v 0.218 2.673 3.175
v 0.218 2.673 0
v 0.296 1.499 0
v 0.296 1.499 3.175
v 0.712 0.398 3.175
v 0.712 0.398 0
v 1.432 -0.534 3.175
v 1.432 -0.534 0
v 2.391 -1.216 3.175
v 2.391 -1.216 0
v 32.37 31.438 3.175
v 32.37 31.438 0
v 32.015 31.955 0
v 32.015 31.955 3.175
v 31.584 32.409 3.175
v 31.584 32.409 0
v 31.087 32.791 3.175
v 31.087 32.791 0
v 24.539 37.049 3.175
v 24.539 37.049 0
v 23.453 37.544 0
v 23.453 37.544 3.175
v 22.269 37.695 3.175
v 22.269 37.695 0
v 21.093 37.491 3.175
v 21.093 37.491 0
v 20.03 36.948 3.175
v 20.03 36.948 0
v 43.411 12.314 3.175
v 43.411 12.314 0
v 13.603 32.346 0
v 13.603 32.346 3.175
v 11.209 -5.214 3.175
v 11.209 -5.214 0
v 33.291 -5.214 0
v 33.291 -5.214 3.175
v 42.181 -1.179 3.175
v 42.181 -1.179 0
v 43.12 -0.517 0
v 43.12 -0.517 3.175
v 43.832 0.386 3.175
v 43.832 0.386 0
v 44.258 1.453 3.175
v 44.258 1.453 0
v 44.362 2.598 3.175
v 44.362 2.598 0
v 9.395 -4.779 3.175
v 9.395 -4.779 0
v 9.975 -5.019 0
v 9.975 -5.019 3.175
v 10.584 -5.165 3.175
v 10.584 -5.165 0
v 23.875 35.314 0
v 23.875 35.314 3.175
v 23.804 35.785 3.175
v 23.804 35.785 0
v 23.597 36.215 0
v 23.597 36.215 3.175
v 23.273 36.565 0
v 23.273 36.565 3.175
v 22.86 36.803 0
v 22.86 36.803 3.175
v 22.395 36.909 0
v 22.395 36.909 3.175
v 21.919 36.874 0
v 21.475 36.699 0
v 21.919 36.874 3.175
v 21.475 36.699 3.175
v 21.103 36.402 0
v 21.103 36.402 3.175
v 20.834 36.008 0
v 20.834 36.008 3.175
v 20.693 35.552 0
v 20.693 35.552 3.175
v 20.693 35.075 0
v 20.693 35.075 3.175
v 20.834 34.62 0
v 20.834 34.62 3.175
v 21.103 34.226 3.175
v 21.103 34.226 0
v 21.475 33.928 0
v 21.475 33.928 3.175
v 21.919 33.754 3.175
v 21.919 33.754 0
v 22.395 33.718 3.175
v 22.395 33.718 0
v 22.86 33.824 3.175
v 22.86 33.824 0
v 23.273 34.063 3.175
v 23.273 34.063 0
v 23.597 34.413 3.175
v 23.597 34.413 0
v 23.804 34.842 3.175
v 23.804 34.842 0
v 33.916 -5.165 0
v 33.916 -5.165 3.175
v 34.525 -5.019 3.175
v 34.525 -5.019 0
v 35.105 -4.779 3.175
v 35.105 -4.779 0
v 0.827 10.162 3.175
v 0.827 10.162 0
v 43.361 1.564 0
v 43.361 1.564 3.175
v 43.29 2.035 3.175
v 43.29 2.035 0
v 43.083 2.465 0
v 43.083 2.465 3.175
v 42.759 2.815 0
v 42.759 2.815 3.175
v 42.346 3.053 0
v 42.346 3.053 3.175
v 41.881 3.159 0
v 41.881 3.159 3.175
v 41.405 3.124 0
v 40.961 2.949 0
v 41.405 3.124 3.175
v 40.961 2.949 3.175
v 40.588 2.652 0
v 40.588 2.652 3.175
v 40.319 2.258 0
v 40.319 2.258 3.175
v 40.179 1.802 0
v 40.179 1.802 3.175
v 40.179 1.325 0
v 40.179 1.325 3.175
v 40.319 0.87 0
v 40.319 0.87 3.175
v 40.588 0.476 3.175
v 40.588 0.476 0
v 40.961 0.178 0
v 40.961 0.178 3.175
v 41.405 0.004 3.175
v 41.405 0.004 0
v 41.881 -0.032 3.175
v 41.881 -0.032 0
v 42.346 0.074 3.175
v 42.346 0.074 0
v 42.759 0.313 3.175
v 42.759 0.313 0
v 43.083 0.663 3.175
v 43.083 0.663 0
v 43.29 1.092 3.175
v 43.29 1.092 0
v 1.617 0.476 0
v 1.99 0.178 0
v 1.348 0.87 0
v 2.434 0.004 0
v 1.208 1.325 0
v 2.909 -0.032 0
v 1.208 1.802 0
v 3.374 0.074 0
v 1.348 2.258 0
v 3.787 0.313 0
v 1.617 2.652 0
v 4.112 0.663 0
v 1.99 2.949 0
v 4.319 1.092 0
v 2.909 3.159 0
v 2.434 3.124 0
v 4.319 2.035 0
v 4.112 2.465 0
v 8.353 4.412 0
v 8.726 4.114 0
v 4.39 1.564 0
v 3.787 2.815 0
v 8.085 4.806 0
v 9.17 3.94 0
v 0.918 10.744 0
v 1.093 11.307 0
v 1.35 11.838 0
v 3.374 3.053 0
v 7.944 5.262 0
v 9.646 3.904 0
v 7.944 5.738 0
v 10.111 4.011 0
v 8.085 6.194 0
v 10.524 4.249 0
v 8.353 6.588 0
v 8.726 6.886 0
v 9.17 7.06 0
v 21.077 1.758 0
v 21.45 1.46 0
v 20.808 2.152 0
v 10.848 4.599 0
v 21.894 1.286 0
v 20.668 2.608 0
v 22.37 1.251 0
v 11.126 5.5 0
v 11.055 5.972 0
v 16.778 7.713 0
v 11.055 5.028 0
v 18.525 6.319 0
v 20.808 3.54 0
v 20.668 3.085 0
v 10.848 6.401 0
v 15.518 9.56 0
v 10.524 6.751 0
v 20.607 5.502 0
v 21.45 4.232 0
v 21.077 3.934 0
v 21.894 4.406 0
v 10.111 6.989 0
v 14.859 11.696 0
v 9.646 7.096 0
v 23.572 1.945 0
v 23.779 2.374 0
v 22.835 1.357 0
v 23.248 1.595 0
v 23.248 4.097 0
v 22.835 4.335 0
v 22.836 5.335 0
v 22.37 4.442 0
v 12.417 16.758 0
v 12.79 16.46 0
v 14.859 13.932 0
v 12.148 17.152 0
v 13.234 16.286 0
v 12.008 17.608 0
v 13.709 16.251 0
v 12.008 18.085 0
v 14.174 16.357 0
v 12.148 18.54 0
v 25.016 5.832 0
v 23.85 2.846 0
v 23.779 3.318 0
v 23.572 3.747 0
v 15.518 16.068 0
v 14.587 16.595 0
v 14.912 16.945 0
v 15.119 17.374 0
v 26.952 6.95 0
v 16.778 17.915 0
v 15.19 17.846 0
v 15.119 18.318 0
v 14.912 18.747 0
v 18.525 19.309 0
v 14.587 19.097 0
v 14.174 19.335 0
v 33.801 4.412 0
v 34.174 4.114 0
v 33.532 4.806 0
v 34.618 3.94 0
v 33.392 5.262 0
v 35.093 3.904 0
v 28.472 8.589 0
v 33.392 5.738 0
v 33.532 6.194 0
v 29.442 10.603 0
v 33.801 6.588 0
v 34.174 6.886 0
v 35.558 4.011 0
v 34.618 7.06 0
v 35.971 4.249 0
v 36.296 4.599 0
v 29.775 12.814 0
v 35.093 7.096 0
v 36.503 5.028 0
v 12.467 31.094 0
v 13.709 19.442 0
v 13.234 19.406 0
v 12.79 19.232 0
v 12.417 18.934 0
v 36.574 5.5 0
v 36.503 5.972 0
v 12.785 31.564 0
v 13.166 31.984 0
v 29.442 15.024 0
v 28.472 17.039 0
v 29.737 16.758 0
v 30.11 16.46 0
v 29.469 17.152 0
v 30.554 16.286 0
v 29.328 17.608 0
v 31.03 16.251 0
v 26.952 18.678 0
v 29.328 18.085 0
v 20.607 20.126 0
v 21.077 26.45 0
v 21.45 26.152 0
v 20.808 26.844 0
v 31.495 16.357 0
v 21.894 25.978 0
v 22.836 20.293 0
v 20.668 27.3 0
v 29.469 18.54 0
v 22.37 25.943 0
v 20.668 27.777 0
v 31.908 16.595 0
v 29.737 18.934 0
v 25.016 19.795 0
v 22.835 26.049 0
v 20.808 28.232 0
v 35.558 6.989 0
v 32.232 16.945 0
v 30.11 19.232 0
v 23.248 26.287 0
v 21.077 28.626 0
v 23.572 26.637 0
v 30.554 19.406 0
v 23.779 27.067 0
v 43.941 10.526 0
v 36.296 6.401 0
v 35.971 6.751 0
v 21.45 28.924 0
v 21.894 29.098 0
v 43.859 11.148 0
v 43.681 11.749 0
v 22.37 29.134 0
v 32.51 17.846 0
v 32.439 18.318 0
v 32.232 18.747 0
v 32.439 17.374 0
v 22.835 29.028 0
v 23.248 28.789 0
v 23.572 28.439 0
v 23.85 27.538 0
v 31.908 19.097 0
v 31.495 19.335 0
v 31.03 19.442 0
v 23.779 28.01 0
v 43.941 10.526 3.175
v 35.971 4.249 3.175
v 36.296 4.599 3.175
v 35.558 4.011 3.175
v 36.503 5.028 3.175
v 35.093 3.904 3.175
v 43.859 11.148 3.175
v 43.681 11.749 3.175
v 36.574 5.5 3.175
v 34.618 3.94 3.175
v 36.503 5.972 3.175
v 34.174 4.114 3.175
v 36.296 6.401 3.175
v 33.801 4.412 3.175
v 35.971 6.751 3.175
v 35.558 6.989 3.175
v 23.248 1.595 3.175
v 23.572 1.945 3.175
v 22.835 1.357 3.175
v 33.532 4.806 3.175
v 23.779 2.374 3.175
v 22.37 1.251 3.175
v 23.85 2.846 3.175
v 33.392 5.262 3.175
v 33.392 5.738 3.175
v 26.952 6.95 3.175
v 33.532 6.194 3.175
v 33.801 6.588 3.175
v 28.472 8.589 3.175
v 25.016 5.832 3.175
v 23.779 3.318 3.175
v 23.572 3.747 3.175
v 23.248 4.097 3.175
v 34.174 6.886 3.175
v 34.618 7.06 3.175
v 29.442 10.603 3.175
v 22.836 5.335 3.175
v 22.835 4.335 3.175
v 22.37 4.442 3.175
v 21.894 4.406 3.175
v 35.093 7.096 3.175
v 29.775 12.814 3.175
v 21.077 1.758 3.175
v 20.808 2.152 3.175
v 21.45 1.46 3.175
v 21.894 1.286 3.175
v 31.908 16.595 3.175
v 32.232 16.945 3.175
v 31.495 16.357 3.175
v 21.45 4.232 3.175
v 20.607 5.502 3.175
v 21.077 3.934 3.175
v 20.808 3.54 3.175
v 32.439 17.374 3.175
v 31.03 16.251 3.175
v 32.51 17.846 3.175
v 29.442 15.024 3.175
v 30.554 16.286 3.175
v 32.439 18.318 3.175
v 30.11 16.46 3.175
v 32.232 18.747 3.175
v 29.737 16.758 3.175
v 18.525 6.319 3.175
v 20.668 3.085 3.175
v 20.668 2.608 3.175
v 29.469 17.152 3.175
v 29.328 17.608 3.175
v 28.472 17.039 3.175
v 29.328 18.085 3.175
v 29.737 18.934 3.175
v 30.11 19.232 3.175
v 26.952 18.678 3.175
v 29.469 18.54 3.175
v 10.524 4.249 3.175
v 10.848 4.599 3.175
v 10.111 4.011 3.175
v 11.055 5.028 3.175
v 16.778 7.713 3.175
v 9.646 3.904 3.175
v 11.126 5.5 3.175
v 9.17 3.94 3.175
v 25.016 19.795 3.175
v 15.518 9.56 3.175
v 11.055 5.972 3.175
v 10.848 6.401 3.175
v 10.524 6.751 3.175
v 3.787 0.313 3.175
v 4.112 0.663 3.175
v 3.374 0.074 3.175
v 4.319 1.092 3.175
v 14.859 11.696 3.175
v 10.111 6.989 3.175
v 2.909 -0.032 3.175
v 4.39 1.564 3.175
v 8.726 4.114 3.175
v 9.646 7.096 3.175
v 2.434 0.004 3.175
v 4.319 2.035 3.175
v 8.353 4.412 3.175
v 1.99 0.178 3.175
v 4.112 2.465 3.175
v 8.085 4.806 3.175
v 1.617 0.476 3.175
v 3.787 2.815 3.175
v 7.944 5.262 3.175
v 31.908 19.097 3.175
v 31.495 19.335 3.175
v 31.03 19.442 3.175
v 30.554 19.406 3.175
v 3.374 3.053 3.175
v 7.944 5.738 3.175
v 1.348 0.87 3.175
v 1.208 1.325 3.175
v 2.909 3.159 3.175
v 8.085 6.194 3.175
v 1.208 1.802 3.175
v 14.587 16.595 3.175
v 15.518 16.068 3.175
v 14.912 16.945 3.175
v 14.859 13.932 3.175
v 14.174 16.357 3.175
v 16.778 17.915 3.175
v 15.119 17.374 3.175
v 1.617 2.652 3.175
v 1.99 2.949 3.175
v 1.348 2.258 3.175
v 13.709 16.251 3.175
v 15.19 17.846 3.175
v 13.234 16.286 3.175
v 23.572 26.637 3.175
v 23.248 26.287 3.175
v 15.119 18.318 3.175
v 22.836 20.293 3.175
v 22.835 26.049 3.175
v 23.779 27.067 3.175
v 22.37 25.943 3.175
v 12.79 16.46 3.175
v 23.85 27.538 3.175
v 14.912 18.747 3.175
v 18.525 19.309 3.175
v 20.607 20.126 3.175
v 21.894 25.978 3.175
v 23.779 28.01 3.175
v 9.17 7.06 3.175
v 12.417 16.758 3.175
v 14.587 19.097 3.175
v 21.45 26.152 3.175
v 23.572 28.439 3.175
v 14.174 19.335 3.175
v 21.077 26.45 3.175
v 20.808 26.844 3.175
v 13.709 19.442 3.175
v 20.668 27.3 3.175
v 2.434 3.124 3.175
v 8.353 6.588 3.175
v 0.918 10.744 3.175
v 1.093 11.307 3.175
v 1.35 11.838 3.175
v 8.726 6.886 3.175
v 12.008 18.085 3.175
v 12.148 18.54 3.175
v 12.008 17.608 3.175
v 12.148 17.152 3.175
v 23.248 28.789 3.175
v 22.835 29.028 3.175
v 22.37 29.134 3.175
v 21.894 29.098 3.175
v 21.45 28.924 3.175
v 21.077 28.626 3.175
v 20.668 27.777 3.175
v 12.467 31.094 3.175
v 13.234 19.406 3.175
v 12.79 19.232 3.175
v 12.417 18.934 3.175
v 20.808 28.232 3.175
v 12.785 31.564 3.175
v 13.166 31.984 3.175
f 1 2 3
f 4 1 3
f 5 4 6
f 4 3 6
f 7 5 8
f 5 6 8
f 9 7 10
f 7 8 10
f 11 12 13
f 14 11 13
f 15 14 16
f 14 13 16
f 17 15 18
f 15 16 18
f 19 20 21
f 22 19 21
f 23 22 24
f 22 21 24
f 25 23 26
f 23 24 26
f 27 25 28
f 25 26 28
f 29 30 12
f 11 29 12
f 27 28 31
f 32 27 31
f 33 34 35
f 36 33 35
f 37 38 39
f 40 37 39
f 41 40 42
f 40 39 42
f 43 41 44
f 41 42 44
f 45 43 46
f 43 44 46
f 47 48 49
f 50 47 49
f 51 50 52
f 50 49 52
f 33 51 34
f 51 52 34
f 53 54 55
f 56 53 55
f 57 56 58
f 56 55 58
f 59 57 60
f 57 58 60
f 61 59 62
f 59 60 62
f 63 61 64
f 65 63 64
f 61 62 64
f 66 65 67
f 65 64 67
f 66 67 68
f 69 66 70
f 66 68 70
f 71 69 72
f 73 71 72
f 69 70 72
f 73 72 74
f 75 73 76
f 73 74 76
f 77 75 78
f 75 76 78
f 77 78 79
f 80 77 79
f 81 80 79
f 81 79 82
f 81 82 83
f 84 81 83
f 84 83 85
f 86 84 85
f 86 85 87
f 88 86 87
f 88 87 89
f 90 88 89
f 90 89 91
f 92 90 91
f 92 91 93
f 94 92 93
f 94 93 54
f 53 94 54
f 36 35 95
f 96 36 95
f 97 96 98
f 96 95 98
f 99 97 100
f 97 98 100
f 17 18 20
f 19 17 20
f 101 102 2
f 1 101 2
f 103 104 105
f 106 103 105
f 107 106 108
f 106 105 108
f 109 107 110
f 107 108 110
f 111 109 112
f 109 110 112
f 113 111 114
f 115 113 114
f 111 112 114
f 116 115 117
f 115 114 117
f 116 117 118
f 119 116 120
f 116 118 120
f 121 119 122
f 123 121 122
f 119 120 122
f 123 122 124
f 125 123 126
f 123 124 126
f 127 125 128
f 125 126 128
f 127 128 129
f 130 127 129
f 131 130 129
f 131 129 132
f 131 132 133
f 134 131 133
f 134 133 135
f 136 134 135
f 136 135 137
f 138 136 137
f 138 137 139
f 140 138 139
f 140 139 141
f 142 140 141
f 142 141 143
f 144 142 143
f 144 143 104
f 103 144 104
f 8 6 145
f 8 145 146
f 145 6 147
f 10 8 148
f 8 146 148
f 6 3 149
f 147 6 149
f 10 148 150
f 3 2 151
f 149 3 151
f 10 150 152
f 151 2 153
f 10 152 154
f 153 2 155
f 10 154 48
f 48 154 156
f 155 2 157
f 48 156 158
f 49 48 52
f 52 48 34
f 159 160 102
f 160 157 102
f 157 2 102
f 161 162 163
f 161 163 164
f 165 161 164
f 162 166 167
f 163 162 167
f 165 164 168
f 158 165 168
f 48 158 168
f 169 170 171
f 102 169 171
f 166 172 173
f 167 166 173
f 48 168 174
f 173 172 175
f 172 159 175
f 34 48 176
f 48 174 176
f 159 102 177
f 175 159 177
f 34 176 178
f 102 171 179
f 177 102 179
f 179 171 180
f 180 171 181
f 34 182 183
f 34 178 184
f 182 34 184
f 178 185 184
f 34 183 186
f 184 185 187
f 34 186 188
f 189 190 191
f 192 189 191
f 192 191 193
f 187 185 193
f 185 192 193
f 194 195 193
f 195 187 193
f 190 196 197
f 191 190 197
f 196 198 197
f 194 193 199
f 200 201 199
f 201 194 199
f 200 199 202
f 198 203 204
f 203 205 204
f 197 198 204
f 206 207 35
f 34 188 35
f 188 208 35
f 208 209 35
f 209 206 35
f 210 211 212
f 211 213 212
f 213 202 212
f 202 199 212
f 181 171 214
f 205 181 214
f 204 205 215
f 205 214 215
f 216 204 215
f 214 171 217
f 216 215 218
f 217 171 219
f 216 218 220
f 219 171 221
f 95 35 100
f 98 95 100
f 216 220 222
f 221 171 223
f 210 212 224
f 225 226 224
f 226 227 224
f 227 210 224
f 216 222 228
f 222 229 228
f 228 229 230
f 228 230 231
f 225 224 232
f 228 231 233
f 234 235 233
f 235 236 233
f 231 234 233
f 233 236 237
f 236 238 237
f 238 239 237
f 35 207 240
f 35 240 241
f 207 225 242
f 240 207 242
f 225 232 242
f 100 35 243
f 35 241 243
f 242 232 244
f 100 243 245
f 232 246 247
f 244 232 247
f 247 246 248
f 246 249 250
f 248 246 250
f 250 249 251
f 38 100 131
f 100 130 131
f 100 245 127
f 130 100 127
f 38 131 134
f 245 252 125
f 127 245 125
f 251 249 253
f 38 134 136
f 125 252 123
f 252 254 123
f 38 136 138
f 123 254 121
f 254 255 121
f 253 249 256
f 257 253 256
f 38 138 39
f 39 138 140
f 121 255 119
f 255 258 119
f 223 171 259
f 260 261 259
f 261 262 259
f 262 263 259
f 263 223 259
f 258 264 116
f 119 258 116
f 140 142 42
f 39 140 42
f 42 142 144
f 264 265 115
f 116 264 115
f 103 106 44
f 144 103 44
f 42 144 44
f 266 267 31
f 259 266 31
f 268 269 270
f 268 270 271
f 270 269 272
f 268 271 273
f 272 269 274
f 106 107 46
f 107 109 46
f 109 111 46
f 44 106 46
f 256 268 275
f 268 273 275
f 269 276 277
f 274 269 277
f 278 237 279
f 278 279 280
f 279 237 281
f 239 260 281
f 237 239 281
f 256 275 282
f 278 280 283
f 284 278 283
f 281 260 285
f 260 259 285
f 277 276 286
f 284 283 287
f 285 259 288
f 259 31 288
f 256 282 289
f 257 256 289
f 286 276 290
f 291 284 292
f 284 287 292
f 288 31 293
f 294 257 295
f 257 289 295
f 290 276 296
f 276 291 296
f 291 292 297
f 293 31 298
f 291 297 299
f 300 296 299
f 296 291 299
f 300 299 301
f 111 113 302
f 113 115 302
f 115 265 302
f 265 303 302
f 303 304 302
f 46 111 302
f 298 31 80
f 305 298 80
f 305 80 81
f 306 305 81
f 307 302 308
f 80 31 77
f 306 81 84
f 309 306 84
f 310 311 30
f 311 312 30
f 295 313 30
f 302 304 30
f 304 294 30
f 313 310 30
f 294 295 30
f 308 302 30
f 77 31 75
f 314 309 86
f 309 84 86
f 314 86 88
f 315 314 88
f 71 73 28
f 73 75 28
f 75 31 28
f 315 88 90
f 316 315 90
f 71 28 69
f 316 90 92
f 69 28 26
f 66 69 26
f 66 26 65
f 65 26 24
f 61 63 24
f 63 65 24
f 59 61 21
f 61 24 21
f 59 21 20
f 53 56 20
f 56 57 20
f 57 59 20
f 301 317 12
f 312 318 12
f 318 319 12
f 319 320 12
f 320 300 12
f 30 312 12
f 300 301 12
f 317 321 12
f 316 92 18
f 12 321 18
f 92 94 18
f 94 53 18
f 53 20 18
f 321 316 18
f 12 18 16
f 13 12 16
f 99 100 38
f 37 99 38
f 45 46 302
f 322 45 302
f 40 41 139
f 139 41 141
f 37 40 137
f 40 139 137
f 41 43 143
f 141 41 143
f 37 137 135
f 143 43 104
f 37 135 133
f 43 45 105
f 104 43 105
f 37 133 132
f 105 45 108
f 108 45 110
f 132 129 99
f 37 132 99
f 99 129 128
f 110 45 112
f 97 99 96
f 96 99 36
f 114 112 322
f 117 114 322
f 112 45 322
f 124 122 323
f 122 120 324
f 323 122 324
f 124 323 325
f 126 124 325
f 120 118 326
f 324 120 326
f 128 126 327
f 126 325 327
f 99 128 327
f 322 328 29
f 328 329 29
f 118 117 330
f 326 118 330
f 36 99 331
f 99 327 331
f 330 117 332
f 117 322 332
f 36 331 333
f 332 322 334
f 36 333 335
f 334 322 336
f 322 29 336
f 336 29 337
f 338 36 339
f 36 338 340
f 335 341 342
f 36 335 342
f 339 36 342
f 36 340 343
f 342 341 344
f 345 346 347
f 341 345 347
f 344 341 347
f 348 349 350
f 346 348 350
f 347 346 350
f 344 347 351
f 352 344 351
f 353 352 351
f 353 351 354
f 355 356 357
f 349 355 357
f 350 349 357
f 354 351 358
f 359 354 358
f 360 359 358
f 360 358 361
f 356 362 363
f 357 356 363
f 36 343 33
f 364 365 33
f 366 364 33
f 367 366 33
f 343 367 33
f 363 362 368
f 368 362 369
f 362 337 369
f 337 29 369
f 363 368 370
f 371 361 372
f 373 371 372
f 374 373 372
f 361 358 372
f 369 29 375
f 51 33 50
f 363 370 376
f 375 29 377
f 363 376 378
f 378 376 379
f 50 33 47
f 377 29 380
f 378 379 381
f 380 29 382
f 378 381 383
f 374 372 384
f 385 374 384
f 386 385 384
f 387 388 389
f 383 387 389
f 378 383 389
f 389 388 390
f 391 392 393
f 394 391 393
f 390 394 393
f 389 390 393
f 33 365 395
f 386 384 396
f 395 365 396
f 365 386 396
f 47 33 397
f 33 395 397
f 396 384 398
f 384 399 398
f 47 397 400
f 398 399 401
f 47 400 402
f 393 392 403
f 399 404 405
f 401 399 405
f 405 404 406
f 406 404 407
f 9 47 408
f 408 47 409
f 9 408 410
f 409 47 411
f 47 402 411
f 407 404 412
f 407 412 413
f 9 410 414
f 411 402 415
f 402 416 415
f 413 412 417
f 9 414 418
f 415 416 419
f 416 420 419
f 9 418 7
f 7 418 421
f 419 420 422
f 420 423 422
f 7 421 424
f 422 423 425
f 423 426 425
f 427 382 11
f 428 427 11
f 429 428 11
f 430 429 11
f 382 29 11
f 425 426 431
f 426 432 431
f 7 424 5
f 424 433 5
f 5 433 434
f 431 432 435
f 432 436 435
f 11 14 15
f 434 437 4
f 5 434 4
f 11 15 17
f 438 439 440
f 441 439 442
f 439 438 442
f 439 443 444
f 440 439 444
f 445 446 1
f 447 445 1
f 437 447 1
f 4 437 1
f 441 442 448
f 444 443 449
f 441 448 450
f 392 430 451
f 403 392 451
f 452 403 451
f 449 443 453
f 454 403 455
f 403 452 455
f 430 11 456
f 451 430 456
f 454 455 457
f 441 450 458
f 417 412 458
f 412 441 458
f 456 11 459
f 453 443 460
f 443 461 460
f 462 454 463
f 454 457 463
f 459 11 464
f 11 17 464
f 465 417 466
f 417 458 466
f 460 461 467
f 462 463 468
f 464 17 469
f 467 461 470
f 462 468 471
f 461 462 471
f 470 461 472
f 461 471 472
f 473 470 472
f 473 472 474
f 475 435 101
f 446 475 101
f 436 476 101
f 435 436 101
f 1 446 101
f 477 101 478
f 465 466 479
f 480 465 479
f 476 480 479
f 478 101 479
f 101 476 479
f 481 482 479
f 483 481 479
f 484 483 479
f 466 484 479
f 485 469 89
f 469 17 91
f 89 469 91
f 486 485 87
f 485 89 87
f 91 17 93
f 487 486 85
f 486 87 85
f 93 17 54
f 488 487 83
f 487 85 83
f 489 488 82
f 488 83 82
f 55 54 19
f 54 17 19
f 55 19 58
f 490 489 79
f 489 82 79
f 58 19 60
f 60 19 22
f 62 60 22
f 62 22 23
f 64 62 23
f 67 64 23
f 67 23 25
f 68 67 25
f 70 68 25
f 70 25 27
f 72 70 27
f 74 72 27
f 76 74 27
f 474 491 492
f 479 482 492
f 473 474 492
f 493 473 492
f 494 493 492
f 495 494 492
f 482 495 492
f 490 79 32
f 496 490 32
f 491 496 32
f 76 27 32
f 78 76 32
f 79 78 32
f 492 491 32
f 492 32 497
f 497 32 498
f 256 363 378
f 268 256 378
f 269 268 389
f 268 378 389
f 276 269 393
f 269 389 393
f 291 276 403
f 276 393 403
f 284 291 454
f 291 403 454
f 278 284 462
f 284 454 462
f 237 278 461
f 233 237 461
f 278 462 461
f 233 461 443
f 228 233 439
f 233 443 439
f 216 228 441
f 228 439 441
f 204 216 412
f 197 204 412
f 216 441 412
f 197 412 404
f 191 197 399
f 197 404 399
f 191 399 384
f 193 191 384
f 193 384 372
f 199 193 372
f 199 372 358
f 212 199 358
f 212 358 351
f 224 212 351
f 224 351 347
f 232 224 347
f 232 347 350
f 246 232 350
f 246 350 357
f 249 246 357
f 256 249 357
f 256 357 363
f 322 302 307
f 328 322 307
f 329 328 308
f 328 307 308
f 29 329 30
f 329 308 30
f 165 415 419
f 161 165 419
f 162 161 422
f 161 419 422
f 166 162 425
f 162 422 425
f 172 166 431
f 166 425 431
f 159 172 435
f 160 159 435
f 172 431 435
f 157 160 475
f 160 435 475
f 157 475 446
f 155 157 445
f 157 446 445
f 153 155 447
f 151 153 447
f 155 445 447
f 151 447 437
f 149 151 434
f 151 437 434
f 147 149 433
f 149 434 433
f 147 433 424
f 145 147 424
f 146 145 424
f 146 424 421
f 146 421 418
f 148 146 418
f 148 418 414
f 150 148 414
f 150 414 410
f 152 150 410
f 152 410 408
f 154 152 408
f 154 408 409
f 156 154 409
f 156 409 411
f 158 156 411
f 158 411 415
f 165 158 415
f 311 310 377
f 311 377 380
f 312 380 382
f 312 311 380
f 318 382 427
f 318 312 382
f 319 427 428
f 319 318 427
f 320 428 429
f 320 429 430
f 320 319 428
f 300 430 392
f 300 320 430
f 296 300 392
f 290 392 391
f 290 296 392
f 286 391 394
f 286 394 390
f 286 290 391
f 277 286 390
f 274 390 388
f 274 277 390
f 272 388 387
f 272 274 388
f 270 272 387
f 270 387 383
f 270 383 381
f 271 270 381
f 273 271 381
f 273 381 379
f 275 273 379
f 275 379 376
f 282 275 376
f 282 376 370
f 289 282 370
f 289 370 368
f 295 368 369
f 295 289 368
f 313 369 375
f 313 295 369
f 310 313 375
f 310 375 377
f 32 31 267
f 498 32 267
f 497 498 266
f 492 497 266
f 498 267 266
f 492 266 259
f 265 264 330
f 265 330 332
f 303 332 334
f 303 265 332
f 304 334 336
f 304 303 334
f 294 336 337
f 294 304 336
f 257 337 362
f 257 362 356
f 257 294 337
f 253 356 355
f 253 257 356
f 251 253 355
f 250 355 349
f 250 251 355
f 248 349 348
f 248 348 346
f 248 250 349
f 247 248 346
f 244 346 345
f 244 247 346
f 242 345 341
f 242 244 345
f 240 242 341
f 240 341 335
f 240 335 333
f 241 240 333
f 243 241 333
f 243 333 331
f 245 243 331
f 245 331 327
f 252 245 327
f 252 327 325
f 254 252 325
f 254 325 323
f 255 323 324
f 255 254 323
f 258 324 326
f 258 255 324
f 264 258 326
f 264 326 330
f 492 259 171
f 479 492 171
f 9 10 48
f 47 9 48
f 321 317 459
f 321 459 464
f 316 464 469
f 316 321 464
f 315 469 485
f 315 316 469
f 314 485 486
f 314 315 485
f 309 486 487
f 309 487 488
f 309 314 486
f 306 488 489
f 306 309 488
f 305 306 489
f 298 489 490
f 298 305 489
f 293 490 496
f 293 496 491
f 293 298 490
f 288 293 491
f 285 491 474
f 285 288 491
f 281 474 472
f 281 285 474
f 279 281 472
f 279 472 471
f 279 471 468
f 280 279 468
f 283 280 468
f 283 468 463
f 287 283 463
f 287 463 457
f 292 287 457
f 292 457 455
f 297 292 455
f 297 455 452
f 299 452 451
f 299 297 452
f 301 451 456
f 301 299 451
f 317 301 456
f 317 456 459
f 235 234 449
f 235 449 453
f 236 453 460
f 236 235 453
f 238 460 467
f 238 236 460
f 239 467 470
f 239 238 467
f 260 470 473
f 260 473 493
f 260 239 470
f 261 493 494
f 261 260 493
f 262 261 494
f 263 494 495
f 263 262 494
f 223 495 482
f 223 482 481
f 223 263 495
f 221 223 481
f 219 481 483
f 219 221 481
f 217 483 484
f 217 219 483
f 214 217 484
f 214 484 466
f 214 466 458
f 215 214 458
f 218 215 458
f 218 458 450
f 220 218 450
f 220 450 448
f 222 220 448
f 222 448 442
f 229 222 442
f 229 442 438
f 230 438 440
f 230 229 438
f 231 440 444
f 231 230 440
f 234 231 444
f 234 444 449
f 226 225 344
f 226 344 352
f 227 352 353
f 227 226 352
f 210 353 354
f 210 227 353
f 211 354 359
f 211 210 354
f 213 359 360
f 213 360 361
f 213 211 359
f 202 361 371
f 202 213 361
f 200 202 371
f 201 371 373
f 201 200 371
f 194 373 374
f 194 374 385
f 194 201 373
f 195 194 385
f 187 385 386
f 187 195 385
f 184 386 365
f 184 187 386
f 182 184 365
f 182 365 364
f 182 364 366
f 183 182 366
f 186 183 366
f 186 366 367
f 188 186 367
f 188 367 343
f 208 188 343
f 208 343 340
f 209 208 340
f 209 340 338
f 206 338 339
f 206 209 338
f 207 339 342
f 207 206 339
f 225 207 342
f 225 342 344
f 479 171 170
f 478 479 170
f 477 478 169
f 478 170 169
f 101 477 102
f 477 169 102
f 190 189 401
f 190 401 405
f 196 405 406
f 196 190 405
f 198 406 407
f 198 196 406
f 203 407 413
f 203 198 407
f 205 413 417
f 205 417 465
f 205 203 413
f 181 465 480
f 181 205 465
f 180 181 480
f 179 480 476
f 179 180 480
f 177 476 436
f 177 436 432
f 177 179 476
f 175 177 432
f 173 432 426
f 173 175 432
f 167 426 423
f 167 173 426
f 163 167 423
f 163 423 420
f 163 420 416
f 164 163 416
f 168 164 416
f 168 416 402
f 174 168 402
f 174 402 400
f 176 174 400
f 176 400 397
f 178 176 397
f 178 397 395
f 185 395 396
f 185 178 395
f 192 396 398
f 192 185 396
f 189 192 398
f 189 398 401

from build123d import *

# Parameters (mm, degrees)
SKETCH1_R           = 1.6
BOSS_EXTRUDE1_DEPTH = 3.175
SKETCH2_R           = 1.6
SKETCH2_R_2         = 7.5
CUT_EXTRUDE1_DEPTH  = 4.175
BOSS_EXTRUDE3_DEPTH = 3.175


with BuildPart() as part:
    # Sketch1 → Boss-Extrude1 (new body)
    with BuildSketch(Plane.XY):
        with BuildLine():
            Line((31.086717458, 32.79124845), (24.539210672, 37.049362302))
            ThreePointArc((24.539210672, 37.049362302), (22.268882249, 37.695107847), (20.029743315, 36.948358029))
            Line((20.029743315, 36.948358029), (13.602836128, 32.346493758))
            ThreePointArc((13.602836128, 32.346493758), (12.968237383, 31.781029757), (12.467444066, 31.094246563))
            Line((12.467444066, 31.094246563), (1.349560594, 11.837507517))
            ThreePointArc((1.349560594, 11.837507517), (0.995156132, 11.028730142), (0.826837821, 10.16190126))
            Line((0.826837821, 10.16190126), (0.217529035, 2.673448792))
            ThreePointArc((0.217529035, 2.673448792), (0.712425098, 0.398045931), (2.390731369, -1.216162343))
            Line((2.390731369, -1.216162343), (9.39530455, -4.779380795))
            ThreePointArc((9.39530455, -4.779380795), (10.276421795, -5.10394936), (11.208926603, -5.214163404))
            Line((11.208926603, -5.214163404), (33.291073397, -5.214163404))
            ThreePointArc((33.291073397, -5.214163404), (34.223578205, -5.10394936), (35.10469545, -4.779380795))
            Line((35.10469545, -4.779380795), (42.181392008, -1.179473262))
            ThreePointArc((42.181392008, -1.179473262), (43.83187157, 0.385744129), (44.362149812, 2.597710054))
            Line((44.362149812, 2.597710054), (43.941412908, 10.526262814))
            ThreePointArc((43.941412908, 10.526262814), (43.781938908, 11.451617014), (43.411134666, 12.314296889))
            Line((43.411134666, 12.314296889), (32.370061269, 31.437996983))
            ThreePointArc((32.370061269, 31.437996983), (31.808360702, 32.190462814), (31.086717458, 32.79124845))
        make_face()
        with Locations((13.589745962, 17.846043489)):
            Circle(SKETCH1_R, mode=Mode.SUBTRACT)
        with Locations((9.526279442, 5.5)):
            Circle(SKETCH1_R, mode=Mode.SUBTRACT)
        with Locations((34.973720558, 5.5)):
            Circle(SKETCH1_R, mode=Mode.SUBTRACT)
        with Locations((30.910254038, 17.846043489)):
            Circle(SKETCH1_R, mode=Mode.SUBTRACT)
        with Locations((22.25, 27.538130468)):
            Circle(SKETCH1_R, mode=Mode.SUBTRACT)
        with Locations((22.25, 2.846043489)):
            Circle(SKETCH1_R, mode=Mode.SUBTRACT)
        with BuildLine():
            Line((42.370834875, 9.312177826), (35.370834875, -2.812177826))
            ThreePointArc((35.370834875, -2.812177826), (34.687822174, -2.995190528), (34.504809472, -2.312177826))
            Line((34.504809472, -2.312177826), (41.504809472, 9.812177826))
            ThreePointArc((41.504809472, 9.812177826), (42.187822174, 9.995190528), (42.370834875, 9.312177826))
        make_face(mode=Mode.SUBTRACT)
        with BuildLine():
            Line((10.01754221, -2.349929674), (3.01754221, 9.774425979))
            ThreePointArc((3.01754221, 9.774425979), (2.334529508, 9.957438681), (2.151516806, 9.274425979))
            Line((2.151516806, 9.274425979), (9.151516806, -2.849929674))
            ThreePointArc((9.151516806, -2.849929674), (9.834529508, -3.032942376), (10.01754221, -2.349929674))
        make_face(mode=Mode.SUBTRACT)
        with BuildLine():
            Line((15.358452868, 31.038130468), (29.358452868, 31.038130468))
            ThreePointArc((29.358452868, 31.038130468), (29.858452868, 31.538130468), (29.358452868, 32.038130468))
            Line((29.358452868, 32.038130468), (15.358452868, 32.038130468))
            ThreePointArc((15.358452868, 32.038130468), (14.858452868, 31.538130468), (15.358452868, 31.038130468))
        make_face(mode=Mode.SUBTRACT)
    extrude(amount=BOSS_EXTRUDE1_DEPTH)

    # Sketch2 → Cut-Extrude1 (cut, through all)
    with BuildSketch(Plane.XY.offset(3.175)):
        with Locations((41.761034996, 1.563830145)):
            Circle(SKETCH2_R)
        with Locations((2.789891826, 1.563830145)):
            Circle(SKETCH2_R)
        with Locations((22.275463411, 12.813830145)):
            Circle(SKETCH2_R_2)
        with Locations((22.275463411, 35.313830145)):
            Circle(SKETCH2_R)
    extrude(amount=-CUT_EXTRUDE1_DEPTH, mode=Mode.SUBTRACT)

    # Sketch3 → Boss-Extrude3 (add)
    with BuildSketch(Plane.XY.offset(3.175)):
        with BuildLine():
            Line((42.370834875, 9.312177826), (35.370834875, -2.812177826))
            ThreePointArc((35.370834875, -2.812177826), (34.687822174, -2.995190528), (34.504809472, -2.312177826))
            Line((34.504809472, -2.312177826), (41.504809472, 9.812177826))
            ThreePointArc((41.504809472, 9.812177826), (42.187822174, 9.995190528), (42.370834875, 9.312177826))
        make_face()
        with BuildLine():
            Line((10.01754221, -2.349929674), (3.01754221, 9.774425979))
            ThreePointArc((3.01754221, 9.774425979), (2.334529508, 9.957438681), (2.151516806, 9.274425979))
            Line((2.151516806, 9.274425979), (9.151516806, -2.849929674))
            ThreePointArc((9.151516806, -2.849929674), (9.834529508, -3.032942376), (10.01754221, -2.349929674))
        make_face()
        with BuildLine():
            Line((15.358452868, 31.038130468), (29.358452868, 31.038130468))
            ThreePointArc((29.358452868, 31.038130468), (29.858452868, 31.538130468), (29.358452868, 32.038130468))
            Line((29.358452868, 32.038130468), (15.358452868, 32.038130468))
            ThreePointArc((15.358452868, 32.038130468), (14.858452868, 31.538130468), (15.358452868, 31.038130468))
        make_face()
    extrude(amount=-BOSS_EXTRUDE3_DEPTH)


solid = part.part
